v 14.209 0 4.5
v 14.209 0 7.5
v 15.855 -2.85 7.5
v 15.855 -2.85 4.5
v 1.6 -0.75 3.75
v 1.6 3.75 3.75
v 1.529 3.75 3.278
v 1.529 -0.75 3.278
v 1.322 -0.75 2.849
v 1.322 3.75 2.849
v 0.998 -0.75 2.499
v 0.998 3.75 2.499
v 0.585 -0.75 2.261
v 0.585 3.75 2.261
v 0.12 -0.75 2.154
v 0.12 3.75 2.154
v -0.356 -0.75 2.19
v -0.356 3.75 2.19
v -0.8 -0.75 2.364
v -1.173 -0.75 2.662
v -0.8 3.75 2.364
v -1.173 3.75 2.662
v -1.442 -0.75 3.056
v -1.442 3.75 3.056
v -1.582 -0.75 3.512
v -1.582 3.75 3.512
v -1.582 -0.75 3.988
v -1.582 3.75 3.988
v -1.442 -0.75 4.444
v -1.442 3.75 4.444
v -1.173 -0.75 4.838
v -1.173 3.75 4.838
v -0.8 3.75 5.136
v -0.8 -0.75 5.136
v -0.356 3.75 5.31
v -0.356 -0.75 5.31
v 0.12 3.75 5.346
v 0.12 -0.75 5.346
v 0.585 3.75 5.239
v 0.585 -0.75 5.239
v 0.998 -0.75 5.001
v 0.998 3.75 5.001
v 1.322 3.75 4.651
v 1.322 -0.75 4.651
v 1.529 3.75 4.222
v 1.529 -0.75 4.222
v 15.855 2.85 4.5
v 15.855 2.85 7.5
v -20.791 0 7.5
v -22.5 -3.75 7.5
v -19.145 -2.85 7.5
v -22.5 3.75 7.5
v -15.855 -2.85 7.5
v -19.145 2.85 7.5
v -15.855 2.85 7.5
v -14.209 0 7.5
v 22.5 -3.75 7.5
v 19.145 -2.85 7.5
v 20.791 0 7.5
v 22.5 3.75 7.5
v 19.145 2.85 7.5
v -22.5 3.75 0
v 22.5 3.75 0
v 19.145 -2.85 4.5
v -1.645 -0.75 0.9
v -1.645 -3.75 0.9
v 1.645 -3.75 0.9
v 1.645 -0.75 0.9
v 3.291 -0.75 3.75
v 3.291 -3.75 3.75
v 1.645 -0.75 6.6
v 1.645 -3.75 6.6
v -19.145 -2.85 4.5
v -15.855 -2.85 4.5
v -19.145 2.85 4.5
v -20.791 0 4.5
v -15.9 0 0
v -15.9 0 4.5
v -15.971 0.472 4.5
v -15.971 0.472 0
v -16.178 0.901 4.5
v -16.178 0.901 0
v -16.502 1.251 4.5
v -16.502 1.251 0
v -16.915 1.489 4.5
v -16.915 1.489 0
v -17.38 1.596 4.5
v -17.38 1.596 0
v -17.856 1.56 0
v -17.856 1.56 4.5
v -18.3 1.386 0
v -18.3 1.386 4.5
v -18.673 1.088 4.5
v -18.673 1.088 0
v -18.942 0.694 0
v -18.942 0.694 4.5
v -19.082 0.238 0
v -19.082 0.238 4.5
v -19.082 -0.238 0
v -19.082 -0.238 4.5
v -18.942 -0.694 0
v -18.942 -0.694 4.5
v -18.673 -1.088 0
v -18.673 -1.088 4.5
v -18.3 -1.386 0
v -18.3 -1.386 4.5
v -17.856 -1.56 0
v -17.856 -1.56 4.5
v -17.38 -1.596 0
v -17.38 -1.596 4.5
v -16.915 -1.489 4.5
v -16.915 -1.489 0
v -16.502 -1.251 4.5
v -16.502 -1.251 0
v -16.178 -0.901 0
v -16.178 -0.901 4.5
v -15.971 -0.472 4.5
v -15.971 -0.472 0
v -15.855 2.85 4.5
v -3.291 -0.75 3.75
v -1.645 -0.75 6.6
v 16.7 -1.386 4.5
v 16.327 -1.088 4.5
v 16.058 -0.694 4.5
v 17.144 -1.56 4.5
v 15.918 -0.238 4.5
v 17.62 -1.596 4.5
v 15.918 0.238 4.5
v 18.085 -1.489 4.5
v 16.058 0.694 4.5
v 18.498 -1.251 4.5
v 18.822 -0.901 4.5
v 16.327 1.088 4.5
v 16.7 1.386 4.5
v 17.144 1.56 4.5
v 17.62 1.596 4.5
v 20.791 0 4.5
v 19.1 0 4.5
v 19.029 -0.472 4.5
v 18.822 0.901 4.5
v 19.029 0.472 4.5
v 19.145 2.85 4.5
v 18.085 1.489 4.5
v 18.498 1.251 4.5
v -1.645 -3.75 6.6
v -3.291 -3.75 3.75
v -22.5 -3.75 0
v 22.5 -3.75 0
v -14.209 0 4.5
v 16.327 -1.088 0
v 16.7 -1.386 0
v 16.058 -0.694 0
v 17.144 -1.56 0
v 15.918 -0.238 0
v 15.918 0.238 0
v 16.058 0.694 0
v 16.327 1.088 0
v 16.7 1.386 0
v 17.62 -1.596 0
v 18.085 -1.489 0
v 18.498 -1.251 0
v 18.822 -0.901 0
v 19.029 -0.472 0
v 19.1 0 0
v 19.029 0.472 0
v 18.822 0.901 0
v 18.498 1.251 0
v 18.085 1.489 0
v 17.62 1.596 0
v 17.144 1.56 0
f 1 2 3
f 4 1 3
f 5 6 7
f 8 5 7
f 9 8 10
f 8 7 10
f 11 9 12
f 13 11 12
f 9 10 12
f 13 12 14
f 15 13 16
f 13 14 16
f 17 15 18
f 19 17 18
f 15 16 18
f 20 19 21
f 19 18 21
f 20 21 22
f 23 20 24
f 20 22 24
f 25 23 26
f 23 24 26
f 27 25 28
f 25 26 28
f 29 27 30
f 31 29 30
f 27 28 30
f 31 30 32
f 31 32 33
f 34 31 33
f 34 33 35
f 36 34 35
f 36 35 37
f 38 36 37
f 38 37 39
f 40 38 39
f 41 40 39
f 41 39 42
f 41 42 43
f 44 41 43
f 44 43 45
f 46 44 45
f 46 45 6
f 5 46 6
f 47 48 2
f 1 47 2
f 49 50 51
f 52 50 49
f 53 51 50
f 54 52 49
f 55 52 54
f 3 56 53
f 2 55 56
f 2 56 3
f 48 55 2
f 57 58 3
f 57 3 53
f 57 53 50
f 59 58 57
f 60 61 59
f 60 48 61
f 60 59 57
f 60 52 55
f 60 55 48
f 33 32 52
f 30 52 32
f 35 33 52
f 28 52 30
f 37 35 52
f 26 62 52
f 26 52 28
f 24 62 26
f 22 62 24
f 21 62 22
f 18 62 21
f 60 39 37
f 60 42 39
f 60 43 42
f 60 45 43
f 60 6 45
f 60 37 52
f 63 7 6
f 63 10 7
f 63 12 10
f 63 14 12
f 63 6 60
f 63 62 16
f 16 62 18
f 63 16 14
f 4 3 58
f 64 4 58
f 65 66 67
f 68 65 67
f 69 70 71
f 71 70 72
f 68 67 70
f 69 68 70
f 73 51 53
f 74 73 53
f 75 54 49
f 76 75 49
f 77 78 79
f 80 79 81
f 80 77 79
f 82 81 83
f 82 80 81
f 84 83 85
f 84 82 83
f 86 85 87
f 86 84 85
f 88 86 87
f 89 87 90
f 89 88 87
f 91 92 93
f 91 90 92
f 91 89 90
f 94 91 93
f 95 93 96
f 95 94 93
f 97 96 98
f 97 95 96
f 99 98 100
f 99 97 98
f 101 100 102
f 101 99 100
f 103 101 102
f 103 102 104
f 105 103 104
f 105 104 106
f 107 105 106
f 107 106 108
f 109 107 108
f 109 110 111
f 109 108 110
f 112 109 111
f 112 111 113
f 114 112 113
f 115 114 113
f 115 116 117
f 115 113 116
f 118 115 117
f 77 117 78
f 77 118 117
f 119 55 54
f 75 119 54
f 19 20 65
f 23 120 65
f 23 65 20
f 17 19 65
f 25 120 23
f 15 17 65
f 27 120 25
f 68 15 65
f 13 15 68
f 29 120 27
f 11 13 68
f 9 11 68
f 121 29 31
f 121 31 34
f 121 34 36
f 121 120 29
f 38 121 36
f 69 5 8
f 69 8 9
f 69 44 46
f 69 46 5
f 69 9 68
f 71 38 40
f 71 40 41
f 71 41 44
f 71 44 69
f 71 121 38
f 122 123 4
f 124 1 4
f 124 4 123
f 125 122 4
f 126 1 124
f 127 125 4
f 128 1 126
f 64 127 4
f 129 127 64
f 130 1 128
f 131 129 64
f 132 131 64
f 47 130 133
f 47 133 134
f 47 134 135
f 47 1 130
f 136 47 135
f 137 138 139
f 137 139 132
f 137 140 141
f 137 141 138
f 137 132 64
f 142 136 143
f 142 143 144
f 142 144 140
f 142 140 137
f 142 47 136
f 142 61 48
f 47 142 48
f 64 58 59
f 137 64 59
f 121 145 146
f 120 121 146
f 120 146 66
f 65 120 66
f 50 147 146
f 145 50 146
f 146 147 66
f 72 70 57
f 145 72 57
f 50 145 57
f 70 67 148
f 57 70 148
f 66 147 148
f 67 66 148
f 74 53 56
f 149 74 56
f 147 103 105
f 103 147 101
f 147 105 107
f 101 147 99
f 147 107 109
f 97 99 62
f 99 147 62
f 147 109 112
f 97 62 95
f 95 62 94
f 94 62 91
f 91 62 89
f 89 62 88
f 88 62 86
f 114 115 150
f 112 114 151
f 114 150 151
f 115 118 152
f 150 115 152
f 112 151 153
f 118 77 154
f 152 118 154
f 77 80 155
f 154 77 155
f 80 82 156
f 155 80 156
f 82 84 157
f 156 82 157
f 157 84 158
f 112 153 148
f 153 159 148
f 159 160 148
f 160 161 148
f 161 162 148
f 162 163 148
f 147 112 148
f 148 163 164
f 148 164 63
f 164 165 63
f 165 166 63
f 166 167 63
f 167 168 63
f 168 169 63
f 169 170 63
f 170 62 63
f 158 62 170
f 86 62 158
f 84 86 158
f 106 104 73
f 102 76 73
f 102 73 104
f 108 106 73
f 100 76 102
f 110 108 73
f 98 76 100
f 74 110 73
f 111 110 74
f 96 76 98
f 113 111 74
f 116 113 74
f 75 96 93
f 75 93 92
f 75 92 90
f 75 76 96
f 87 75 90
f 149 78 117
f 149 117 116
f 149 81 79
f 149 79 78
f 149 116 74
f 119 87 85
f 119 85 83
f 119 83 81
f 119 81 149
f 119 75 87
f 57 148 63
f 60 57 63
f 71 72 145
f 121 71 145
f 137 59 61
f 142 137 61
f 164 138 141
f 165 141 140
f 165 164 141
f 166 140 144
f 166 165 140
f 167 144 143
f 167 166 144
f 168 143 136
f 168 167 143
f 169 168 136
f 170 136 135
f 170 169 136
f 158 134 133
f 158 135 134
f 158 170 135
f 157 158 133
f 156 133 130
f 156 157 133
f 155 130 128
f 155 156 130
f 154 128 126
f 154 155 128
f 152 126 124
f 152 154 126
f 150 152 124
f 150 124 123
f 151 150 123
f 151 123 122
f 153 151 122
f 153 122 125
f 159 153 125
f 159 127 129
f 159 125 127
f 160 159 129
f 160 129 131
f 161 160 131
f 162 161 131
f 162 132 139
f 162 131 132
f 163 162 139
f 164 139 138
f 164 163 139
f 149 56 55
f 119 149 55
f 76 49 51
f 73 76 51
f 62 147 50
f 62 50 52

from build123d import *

# Parameters (mm, degrees)
CROQUIS1_W              = 45
CROQUIS1_H              = 7.5
CROQUIS1_R              = 1.6
SALIENTE_EXTRUIR1_DEPTH = 7.5
CORTAR_EXTRUIR1_REACH   = 9.5
CROQUIS2_R              = 1.6
CORTAR_EXTRUIR2_DEPTH   = 3
CORTAR_EXTRUIR3_DEPTH   = 3


with BuildPart() as part:
    # Croquis1 → Saliente-Extruir1 (new body)
    with BuildSketch(Plane.XY):
        Rectangle(CROQUIS1_W, CROQUIS1_H)
        with Locations((-17.5, 0)):
            Circle(CROQUIS1_R, mode=Mode.SUBTRACT)
        with Locations((17.5, 0)):
            Circle(CROQUIS1_R, mode=Mode.SUBTRACT)
    extrude(amount=SALIENTE_EXTRUIR1_DEPTH)

    # Croquis2 → Cortar-Extruir1 (cut, up to next)
    with BuildSketch(Plane(origin=(0, 3.75, 0), x_dir=(1, 0, 0), z_dir=(0, 1, 0)), mode=Mode.PRIVATE) as cortar_extruir1_sk1:
        with Locations((0, -3.75)):
            Circle(CROQUIS2_R)
    cortar_extruir1_tool1 = extrude(cortar_extruir1_sk1.sketch, amount=-CORTAR_EXTRUIR1_REACH, mode=Mode.PRIVATE) & part.part
    add(cortar_extruir1_tool1.solids().sort_by_distance((0, 3.75, 3.75))[0], mode=Mode.SUBTRACT)

    # Croquis3 → Cortar-Extruir2 (cut)
    with BuildSketch(Plane.XZ.offset(3.75)):
        Polygon((3.290896534, 3.75), (1.645448267, 6.6), (-1.645448267, 6.6), (-3.290896534, 3.75), (-1.645448267, 0.9), (1.645448267, 0.9), align=None)
    extrude(amount=-CORTAR_EXTRUIR2_DEPTH, mode=Mode.SUBTRACT)

    # Croquis4 → Cortar-Extruir3 (cut)
    with BuildSketch(Plane.XY.offset(7.5)):
        Polygon((-14.209103466, 0), (-15.854551733, 2.85), (-19.145448267, 2.85), (-20.790896534, 0), (-19.145448267, -2.85), (-15.854551733, -2.85), align=None)
        Polygon((20.790896534, 0), (19.145448267, 2.85), (15.854551733, 2.85), (14.209103466, 0), (15.854551733, -2.85), (19.145448267, -2.85), align=None)
    extrude(amount=-CORTAR_EXTRUIR3_DEPTH, mode=Mode.SUBTRACT)


solid = part.part
